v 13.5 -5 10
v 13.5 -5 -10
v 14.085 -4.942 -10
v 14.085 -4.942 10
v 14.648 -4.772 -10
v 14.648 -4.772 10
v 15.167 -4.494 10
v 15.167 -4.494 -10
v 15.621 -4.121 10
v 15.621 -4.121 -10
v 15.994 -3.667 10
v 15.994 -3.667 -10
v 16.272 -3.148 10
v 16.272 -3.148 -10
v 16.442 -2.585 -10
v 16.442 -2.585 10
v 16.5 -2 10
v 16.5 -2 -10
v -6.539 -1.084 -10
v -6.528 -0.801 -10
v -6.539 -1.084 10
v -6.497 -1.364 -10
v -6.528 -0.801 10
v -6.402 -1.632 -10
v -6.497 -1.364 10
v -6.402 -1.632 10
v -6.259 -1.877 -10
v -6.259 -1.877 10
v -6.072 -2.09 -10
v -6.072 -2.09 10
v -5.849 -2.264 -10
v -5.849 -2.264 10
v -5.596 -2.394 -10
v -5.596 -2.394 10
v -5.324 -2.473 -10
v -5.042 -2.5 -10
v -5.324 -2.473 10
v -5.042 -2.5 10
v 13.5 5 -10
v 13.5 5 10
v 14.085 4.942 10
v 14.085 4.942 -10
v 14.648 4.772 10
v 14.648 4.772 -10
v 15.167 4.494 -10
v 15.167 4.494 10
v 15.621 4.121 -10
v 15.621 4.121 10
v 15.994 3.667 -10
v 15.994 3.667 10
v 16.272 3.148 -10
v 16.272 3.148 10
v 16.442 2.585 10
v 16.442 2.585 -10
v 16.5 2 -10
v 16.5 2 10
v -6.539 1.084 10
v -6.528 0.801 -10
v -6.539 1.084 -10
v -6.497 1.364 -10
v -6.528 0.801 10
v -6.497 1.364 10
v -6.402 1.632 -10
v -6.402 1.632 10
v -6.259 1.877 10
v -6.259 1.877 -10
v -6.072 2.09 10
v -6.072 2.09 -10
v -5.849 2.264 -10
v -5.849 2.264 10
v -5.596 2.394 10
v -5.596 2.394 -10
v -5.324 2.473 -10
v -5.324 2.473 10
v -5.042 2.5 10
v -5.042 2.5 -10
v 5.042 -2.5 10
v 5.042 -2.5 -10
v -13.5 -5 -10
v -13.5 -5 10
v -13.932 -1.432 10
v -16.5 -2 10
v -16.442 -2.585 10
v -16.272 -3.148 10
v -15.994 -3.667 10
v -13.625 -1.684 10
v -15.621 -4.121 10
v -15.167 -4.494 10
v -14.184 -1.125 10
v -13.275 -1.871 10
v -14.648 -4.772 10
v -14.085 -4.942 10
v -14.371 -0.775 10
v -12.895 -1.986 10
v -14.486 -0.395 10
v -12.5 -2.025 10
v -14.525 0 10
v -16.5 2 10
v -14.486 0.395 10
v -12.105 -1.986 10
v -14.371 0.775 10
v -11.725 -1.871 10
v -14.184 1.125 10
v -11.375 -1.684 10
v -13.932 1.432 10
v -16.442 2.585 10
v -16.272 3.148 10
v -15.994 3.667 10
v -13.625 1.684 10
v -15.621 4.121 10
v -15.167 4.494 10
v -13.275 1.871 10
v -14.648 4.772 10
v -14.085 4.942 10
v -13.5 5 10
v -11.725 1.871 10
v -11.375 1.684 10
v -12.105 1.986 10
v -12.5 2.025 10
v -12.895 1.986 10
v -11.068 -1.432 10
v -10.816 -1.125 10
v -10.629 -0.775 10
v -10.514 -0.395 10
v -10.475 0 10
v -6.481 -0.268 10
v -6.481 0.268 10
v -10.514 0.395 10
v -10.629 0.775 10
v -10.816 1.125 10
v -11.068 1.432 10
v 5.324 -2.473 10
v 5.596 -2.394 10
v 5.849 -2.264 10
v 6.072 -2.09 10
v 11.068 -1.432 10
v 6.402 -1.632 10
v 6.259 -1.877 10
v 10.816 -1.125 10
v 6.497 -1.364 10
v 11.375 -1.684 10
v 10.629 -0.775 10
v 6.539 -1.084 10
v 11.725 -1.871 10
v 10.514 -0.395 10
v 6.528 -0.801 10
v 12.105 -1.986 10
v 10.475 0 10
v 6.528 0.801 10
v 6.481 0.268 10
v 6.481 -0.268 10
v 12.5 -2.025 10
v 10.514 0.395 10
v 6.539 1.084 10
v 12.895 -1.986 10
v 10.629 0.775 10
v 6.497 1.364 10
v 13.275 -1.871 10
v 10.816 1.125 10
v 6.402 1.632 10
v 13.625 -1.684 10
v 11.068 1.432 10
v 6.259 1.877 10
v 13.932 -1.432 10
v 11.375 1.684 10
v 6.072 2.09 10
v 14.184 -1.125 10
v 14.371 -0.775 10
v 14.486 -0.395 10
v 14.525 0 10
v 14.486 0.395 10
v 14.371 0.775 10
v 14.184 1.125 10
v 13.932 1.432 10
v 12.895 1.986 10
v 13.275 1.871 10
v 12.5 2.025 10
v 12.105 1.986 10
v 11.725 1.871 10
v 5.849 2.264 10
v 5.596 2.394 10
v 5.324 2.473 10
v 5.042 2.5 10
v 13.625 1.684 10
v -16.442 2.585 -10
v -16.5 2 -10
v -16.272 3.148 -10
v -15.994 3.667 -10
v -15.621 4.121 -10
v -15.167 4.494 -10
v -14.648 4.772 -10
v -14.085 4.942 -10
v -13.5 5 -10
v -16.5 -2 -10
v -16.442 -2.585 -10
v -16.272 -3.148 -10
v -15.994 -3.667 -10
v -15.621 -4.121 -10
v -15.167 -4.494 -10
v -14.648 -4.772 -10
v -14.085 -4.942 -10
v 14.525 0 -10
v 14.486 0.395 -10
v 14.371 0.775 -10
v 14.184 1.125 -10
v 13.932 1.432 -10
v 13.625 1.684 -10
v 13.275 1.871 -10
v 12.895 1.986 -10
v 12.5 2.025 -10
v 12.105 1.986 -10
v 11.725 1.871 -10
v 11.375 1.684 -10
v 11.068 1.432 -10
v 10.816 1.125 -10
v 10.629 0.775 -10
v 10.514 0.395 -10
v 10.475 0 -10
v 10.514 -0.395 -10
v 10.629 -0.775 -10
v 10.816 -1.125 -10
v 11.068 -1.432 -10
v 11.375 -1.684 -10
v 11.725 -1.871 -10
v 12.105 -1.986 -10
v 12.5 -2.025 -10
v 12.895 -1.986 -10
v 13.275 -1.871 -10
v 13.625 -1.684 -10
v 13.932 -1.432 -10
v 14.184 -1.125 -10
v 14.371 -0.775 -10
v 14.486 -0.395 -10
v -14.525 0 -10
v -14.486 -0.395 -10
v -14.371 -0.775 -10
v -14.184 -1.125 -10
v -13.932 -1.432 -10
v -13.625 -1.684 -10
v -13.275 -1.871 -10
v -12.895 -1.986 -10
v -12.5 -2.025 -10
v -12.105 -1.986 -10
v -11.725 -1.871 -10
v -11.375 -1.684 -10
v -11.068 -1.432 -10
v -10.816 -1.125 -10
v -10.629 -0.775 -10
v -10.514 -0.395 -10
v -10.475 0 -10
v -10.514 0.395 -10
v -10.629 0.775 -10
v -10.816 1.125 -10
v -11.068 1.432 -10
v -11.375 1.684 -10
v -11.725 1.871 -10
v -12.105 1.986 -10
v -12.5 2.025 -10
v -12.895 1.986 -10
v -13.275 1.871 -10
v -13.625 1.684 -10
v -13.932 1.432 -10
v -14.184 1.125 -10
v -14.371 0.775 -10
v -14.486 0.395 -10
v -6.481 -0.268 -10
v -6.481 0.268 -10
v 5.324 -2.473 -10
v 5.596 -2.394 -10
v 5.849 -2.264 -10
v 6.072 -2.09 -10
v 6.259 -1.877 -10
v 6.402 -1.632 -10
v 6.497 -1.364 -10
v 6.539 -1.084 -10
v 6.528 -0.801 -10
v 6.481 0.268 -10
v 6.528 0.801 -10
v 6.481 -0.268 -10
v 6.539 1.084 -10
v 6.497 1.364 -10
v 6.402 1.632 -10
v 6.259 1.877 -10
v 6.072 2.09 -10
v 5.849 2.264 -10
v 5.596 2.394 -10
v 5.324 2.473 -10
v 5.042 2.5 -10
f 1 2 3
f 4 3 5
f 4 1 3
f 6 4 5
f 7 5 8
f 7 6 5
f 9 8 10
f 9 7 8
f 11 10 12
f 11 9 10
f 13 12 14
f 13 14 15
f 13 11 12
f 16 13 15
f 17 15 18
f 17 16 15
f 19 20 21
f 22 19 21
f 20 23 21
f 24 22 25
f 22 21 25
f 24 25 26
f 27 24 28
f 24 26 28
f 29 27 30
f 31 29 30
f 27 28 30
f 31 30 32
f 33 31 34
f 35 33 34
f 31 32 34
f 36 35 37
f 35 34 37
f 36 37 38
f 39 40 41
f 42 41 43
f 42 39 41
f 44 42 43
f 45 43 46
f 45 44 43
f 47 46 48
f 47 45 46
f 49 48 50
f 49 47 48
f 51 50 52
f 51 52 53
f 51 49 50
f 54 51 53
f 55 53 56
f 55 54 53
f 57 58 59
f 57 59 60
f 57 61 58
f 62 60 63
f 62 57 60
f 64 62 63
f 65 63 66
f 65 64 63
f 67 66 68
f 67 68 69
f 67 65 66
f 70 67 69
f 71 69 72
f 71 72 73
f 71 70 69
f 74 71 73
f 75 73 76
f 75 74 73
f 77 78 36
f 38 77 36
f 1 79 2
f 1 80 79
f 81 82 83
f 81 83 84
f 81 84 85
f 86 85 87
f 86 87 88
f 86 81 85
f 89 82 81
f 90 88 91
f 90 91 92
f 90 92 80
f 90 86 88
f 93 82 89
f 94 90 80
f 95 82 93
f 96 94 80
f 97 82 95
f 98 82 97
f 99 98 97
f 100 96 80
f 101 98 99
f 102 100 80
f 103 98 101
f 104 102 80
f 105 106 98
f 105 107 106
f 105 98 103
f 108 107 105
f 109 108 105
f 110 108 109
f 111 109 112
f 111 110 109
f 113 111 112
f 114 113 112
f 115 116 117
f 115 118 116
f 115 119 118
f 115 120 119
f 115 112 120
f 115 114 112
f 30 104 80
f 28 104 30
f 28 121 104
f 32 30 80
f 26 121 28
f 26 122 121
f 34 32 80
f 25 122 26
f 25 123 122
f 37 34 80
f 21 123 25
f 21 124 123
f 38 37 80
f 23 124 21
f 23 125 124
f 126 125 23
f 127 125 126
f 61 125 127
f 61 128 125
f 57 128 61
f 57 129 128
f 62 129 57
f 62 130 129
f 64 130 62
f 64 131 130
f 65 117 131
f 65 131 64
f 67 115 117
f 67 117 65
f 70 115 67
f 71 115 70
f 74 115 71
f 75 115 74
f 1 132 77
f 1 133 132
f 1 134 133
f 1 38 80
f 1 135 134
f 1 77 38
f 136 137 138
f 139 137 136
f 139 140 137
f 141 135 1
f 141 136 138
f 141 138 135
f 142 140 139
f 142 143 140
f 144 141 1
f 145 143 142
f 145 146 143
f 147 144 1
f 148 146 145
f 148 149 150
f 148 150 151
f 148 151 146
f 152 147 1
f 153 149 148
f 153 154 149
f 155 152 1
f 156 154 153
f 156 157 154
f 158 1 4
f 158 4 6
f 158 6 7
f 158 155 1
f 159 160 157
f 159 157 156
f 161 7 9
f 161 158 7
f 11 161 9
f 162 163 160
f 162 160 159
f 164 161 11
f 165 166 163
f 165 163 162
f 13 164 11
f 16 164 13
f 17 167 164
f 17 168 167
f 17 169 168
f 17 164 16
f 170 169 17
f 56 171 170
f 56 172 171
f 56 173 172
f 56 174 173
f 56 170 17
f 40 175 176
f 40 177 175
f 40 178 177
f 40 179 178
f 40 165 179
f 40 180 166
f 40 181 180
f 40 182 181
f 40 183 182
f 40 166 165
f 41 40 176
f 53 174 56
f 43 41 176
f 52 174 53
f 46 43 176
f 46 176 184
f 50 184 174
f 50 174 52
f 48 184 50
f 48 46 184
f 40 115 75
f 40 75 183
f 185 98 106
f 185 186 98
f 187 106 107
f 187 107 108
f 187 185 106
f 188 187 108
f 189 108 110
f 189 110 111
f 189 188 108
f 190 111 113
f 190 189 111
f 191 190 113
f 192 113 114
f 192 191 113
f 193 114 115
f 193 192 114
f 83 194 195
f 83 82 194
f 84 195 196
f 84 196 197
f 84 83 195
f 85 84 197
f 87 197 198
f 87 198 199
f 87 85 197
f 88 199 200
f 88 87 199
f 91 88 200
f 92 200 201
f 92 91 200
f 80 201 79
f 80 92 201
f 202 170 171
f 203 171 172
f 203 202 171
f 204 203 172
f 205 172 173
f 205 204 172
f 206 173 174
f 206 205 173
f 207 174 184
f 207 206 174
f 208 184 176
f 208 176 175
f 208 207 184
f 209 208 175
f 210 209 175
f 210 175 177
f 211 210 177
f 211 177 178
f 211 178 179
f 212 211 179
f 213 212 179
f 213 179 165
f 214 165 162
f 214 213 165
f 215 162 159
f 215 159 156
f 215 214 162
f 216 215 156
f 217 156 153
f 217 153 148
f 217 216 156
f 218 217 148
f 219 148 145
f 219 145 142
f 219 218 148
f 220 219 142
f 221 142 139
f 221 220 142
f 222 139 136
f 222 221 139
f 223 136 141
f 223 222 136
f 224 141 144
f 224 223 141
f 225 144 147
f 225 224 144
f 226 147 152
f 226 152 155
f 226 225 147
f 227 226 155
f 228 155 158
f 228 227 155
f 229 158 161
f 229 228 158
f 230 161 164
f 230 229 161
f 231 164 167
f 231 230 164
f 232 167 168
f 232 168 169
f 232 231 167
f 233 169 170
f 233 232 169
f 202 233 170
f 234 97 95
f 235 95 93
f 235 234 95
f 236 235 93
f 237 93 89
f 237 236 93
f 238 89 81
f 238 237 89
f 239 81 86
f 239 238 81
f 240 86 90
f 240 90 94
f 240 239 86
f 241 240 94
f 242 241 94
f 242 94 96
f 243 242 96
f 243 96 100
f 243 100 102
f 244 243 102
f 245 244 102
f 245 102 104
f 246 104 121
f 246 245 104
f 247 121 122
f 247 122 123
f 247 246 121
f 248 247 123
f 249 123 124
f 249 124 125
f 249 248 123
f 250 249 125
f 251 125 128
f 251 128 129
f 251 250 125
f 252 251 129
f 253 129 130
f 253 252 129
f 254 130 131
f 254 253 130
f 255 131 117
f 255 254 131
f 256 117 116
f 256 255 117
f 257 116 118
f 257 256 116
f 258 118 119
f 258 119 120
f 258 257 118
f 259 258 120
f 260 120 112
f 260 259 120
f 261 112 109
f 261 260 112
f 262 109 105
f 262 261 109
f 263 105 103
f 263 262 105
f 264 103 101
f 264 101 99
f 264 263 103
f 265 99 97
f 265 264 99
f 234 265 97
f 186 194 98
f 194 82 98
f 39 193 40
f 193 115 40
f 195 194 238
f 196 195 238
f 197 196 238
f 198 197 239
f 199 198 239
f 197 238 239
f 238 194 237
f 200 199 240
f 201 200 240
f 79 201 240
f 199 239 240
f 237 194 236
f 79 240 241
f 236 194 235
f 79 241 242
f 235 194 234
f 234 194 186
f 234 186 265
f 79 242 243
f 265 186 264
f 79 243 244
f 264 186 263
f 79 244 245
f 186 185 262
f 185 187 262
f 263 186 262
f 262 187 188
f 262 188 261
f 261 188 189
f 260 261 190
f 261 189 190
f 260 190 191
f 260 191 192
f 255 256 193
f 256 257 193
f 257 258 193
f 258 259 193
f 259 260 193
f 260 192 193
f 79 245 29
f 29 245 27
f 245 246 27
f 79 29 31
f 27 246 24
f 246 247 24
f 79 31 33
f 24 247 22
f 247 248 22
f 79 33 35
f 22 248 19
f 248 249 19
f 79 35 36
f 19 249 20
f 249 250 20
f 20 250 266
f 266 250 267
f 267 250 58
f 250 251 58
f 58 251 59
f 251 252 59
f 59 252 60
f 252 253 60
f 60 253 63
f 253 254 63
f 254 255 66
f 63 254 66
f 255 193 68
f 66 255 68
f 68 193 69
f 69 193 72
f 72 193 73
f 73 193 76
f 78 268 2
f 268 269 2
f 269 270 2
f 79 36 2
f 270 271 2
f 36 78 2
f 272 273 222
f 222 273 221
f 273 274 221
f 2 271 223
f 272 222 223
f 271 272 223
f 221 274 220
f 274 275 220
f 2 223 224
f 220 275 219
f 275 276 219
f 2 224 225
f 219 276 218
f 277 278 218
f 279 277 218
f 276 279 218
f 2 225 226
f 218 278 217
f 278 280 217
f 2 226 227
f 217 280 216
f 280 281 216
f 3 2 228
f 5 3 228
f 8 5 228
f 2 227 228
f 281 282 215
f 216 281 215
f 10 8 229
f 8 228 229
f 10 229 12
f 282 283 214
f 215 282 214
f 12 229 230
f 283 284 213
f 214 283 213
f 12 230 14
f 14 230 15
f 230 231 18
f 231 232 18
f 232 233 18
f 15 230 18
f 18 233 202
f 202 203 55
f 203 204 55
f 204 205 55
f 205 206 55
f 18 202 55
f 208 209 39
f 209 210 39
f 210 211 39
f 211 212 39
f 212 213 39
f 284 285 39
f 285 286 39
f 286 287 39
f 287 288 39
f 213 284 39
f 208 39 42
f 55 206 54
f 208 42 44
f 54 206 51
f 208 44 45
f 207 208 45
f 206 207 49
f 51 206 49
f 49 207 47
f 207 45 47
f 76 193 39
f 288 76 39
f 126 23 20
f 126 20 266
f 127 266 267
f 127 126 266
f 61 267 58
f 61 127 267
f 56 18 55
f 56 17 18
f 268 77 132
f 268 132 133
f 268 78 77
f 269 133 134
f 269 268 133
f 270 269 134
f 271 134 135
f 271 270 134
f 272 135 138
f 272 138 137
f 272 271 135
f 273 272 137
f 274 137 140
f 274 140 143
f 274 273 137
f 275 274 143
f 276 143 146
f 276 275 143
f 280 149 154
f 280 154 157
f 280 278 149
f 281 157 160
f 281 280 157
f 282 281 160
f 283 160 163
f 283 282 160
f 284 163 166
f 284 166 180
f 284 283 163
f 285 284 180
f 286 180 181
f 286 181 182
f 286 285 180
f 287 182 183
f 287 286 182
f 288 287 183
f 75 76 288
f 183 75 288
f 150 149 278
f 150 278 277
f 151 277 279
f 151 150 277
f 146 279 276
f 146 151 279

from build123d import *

# Parameters (mm, degrees)
SKETCH_1_W          = 33
SKETCH_1_H          = 10
SKETCH_1_R          = 2.025
EXTRUDE_1_DEPTH     = 10
CUT_EXTRUDE_1_DEPTH = 25
FILLET_1_R          = 1.5
FILLET_2_R          = 3


with BuildPart() as part:
    # 草图1 → 凸台-拉伸1 (new, symmetric)
    with BuildSketch(Plane.XY):
        Rectangle(SKETCH_1_W, SKETCH_1_H)
        with Locations((12.5, 0)):
            Circle(SKETCH_1_R, mode=Mode.SUBTRACT)
        with Locations(Location((-12.5, 0, 0), (0, 0, 180))):
            Circle(SKETCH_1_R, mode=Mode.SUBTRACT)
    extrude(amount=EXTRUDE_1_DEPTH, both=True)

    # 草图2 → 切除-拉伸1 (cut, symmetric)
    with BuildSketch(Plane.XY.offset(10)):
        with BuildLine():
            Line((-7.018154964, 2.5), (7.018154964, 2.5))
            ThreePointArc((7.018154964, 2.5), (6.475, 0), (7.018154964, -2.5))
            Line((7.018154964, -2.5), (-7.018154964, -2.5))
            ThreePointArc((-7.018154964, -2.5), (-6.475, 0), (-7.018154964, 2.5))
        make_face()
    extrude(amount=CUT_EXTRUDE_1_DEPTH, both=True, mode=Mode.SUBTRACT)

    # 圆角1
    fillet_1_edges = [part.edges().sort_by_distance(p)[0] for p in [
        (-7.018154964, -2.5, 0),
        (-7.018154964, 2.5, 0),
        (7.018154964, 2.5, 0),
        (7.018154964, -2.5, 0),
    ]]
    fillet(fillet_1_edges, radius=FILLET_1_R)

    # 圆角2
    fillet_2_edges = [part.edges().sort_by_distance(p)[0] for p in [
        (16.5, -5, 0),
        (-16.5, -5, 0),
        (-16.5, 5, 0),
        (16.5, 5, 0),
    ]]
    fillet(fillet_2_edges, radius=FILLET_2_R)


solid = part.part
